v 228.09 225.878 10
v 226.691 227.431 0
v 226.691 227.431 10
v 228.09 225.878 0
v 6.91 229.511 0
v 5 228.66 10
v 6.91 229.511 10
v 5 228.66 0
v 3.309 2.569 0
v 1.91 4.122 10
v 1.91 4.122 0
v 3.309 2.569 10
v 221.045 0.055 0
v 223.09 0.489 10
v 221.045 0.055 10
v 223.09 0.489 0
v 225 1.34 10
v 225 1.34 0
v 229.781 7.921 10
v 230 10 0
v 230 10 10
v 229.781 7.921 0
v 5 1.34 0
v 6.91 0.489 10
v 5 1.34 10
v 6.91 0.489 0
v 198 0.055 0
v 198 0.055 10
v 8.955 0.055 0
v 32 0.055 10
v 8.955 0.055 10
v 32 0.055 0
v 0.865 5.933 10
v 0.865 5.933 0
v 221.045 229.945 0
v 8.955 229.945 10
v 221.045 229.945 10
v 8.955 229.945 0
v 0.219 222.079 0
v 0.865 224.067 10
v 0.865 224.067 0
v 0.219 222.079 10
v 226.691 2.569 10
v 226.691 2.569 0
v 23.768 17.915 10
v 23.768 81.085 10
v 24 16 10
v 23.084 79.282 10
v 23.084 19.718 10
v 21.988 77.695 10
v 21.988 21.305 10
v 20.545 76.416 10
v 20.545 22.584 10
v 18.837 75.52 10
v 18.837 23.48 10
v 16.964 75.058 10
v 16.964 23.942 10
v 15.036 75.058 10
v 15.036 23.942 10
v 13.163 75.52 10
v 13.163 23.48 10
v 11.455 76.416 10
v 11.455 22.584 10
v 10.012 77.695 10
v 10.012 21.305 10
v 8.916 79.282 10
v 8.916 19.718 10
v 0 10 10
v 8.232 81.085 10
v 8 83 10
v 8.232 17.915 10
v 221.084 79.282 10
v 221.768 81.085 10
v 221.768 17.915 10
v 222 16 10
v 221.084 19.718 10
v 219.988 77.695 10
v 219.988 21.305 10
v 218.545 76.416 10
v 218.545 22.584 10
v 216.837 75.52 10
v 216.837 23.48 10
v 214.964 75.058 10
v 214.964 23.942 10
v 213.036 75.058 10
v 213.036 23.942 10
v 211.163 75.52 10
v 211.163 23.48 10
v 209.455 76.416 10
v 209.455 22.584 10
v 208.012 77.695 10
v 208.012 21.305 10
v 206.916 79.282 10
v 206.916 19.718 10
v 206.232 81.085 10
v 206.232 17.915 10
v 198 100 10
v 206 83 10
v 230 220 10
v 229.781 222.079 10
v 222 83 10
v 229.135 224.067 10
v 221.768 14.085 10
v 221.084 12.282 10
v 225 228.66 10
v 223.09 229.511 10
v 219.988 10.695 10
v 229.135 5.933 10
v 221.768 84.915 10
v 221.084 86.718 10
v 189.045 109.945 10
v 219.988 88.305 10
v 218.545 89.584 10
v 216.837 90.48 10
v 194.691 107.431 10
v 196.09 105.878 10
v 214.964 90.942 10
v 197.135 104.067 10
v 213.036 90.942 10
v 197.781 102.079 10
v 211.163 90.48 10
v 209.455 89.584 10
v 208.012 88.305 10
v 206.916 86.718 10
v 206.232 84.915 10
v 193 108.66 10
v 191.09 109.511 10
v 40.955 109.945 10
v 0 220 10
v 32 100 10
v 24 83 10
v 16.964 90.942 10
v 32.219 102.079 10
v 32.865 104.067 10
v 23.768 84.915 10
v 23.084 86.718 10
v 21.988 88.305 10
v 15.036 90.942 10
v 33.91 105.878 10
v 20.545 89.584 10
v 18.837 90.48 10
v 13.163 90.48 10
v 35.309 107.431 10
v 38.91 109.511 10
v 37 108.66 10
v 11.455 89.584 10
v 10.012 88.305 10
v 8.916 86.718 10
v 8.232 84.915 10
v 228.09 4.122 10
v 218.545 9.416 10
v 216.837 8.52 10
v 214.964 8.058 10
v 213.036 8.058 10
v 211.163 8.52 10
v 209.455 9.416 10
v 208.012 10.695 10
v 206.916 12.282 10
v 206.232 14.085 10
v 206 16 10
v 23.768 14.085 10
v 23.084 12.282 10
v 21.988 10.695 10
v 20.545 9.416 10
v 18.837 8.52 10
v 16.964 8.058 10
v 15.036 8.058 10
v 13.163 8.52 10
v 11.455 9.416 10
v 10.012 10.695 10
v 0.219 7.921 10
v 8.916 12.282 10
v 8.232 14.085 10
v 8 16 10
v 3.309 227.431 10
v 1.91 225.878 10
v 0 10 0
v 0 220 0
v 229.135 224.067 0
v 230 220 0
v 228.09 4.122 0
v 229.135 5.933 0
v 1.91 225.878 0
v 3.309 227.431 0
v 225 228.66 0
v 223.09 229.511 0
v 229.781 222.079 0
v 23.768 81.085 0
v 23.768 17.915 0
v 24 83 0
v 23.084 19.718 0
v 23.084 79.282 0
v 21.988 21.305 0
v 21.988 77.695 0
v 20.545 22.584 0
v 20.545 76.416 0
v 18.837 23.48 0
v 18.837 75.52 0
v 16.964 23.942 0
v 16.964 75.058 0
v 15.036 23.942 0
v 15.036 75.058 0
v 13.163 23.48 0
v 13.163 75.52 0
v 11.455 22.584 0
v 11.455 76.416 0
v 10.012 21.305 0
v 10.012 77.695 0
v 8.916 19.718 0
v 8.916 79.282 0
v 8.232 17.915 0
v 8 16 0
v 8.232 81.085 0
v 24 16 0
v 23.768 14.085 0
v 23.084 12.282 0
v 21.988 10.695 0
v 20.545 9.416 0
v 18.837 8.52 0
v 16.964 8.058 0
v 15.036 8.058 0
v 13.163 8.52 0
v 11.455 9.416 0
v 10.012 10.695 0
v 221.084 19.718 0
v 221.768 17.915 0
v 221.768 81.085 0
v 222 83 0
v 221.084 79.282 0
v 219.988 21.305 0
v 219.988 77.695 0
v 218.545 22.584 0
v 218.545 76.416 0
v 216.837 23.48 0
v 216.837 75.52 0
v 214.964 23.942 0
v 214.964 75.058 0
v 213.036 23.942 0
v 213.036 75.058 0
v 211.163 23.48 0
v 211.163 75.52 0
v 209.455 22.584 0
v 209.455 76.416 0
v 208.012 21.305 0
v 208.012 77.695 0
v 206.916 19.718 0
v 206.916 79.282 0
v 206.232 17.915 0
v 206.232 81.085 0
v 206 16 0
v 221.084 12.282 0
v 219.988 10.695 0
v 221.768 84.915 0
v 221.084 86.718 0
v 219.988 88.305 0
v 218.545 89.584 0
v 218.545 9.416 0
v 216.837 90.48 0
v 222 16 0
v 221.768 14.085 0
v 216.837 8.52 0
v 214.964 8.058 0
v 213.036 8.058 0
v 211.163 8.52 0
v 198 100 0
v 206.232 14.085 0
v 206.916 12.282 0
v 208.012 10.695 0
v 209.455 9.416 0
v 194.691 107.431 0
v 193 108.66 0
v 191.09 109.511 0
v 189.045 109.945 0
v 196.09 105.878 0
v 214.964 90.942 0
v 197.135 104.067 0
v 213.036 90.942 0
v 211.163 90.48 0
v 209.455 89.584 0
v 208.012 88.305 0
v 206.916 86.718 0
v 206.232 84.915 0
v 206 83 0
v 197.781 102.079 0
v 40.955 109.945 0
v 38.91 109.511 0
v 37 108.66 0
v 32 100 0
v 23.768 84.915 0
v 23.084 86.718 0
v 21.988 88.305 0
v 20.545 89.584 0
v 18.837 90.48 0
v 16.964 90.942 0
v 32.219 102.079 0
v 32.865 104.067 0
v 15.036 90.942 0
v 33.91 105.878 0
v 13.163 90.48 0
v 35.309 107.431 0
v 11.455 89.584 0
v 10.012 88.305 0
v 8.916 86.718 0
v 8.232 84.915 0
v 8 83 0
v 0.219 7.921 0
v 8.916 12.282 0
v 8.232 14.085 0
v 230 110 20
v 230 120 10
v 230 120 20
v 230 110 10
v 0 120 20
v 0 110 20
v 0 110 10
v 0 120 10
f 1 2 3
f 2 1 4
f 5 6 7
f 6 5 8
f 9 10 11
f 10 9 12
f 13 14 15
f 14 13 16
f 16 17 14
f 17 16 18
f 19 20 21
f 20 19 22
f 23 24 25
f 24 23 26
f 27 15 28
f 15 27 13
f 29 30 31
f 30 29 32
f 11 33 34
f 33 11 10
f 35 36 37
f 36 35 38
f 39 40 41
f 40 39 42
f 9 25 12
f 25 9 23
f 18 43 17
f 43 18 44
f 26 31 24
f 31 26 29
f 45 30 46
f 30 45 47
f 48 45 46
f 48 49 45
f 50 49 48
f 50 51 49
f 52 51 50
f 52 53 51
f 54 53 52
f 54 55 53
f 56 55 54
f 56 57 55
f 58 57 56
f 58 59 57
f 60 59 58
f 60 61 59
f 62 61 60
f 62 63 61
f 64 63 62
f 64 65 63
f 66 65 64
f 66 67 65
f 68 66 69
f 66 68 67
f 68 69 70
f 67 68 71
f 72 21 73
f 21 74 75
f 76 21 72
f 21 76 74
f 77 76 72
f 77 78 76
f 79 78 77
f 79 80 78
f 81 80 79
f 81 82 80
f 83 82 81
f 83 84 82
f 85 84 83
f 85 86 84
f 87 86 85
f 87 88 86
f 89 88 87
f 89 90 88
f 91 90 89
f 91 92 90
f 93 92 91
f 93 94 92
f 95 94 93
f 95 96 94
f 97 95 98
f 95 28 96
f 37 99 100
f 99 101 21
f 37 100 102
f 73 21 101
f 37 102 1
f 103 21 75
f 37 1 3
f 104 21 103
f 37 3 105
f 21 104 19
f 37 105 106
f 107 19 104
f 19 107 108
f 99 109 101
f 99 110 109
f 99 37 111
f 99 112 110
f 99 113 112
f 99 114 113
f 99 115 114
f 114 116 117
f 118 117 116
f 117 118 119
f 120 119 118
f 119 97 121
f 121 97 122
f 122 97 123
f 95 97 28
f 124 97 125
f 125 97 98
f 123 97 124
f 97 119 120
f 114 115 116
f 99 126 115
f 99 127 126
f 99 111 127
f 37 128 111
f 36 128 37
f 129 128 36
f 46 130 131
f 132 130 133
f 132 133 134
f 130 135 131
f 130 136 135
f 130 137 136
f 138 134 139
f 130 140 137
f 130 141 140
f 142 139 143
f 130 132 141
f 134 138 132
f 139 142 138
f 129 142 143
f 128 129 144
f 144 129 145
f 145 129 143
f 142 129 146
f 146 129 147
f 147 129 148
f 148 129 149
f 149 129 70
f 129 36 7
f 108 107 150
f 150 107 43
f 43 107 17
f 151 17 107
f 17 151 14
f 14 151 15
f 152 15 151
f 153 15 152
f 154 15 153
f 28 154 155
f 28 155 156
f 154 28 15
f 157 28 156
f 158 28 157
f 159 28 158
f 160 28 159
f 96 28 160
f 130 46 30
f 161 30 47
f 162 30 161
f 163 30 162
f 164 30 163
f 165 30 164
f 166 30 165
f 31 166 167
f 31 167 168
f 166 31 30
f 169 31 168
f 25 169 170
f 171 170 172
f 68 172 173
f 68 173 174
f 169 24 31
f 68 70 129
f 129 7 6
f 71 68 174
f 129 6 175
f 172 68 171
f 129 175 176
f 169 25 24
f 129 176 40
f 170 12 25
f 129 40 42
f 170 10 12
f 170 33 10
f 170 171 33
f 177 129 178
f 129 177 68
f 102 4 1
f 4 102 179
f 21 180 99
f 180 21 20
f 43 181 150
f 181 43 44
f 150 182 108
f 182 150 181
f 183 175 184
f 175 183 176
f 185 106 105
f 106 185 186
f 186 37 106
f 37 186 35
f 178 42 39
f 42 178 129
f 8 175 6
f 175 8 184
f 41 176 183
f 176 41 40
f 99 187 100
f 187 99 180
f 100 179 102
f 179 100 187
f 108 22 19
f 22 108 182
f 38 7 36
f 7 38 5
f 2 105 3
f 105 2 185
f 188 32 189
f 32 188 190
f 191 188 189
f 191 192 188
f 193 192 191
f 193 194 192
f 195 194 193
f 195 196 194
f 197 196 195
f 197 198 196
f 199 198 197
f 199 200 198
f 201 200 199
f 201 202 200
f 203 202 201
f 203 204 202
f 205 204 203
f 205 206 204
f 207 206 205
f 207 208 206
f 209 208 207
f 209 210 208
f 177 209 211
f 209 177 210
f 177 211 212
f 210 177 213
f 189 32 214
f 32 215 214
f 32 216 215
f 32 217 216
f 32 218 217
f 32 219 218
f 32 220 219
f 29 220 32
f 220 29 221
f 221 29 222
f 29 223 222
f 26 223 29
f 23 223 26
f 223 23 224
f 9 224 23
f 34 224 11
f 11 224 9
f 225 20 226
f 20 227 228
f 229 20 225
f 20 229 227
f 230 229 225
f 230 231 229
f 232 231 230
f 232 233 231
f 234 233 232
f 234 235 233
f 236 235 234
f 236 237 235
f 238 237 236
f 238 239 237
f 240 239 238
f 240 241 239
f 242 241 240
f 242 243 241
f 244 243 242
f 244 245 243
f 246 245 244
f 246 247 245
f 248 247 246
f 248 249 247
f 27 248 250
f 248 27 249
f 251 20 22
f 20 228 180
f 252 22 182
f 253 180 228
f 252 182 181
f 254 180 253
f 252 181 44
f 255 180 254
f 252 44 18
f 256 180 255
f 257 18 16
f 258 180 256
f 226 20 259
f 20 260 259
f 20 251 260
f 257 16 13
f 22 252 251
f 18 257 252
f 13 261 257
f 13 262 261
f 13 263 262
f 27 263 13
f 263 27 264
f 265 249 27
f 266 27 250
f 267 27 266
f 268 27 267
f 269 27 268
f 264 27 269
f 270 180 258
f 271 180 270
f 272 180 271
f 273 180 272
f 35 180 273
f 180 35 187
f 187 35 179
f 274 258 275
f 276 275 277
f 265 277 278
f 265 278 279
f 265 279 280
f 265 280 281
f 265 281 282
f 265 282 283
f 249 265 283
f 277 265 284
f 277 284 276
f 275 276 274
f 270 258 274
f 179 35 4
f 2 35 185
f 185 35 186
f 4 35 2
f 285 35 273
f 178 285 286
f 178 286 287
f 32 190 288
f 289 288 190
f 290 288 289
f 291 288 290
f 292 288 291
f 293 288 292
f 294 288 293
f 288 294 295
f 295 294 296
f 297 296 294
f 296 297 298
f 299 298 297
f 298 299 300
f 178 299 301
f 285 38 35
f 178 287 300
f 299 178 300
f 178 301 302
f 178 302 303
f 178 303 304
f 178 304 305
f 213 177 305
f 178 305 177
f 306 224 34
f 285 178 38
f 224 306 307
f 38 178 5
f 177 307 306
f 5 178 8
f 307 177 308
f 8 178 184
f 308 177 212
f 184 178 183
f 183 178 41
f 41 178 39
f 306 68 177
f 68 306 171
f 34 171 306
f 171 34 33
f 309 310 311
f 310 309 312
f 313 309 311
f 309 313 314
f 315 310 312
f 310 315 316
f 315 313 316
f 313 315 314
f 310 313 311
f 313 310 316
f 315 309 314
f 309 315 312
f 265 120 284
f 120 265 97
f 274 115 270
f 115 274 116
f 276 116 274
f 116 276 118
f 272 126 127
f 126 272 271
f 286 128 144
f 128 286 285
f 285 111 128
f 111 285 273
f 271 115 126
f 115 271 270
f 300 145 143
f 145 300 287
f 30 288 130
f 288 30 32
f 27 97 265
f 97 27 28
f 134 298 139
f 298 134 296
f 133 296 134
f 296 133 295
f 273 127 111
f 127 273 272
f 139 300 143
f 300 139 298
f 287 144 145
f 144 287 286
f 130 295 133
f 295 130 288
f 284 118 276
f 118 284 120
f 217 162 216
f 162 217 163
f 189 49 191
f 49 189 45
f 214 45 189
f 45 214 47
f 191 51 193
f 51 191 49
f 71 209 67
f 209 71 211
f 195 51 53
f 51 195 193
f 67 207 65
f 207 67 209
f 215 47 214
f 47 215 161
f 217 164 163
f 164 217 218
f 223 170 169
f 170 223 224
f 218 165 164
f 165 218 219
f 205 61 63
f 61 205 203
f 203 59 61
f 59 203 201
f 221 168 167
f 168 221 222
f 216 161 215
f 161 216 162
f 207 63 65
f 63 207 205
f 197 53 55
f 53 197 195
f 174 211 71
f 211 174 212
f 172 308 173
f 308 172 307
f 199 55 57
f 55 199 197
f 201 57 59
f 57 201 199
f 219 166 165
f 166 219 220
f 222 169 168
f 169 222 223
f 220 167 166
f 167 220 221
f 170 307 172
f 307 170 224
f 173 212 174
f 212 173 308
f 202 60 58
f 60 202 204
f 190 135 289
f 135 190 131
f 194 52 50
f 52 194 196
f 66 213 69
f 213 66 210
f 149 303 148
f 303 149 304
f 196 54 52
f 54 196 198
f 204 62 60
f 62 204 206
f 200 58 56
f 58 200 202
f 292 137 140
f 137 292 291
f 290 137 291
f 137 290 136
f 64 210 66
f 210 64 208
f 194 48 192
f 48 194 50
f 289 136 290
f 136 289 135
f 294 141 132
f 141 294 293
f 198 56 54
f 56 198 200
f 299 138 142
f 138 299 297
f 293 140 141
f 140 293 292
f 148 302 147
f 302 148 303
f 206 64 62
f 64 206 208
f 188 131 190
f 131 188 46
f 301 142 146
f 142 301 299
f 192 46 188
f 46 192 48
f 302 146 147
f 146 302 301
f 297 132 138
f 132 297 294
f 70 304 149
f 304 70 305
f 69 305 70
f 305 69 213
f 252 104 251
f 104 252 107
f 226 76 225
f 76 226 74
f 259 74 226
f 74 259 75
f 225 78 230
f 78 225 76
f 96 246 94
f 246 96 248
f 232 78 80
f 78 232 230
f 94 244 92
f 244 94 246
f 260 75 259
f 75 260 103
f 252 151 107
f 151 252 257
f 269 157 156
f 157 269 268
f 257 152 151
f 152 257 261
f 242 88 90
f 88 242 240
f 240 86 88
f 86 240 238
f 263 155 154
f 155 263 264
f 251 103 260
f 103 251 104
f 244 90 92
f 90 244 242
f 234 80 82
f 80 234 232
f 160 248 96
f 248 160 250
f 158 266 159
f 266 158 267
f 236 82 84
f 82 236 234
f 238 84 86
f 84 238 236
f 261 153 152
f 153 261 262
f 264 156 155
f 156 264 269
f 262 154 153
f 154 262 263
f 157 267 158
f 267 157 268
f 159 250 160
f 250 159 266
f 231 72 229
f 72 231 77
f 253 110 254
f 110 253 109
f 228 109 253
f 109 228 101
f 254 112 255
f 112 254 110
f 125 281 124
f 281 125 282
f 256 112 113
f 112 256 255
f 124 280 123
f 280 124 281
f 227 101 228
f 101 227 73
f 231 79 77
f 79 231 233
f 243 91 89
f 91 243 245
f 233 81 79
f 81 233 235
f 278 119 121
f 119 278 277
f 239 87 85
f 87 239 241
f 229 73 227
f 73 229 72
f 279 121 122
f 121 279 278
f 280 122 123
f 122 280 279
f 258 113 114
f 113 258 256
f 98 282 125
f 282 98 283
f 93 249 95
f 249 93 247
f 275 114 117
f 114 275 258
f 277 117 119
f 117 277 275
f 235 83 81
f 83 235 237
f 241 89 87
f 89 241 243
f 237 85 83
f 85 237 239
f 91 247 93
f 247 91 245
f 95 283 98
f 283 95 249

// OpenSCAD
// file: lib_soft.scad
/** 
 * An OpenSCAD library for creating shapes with rounded edges
 *
 * @author Paul Generes <paul.generes@gmail.com>
 * @example soft_example.scad
 */
 
module soft_cube(size=[1, 1, 1], center=false, cr=1) {
	tr = [cr, cr, cr];

    translate(tr) {
        minkowski() {
            sphere(cr);
            cube([size[0]-2*cr, size[1]-2*cr, size[2]-2*cr], center);
        }
    }
}

module softxyz_cube(size=1, center=false, cr=[1, 1, 1]) {
	tr = cr;

    translate(tr) {
        minkowski() {
			scale(cr) {
				sphere(1);
			}
            cube([size[0]-2*cr[0], size[1]-2*cr[1], size[2]-2*cr[2]], center);
        }
    }
}

module softz_cube(size=1, center=false, cr=1) {
	tr = [cr, cr, 0];

    translate(tr) {
        minkowski() {
			cylinder(h=0.00001, r=cr);
			cube([size[0]-2*cr, size[1]-2*cr, size[2]-0.00001], center);
        }
    }
}
// file: lib_boxes5.scad
// boxes5.scad

/**
x1 = width
y1 = depth
z1 = height
r1 = radius of corners
*/
module rounded_rectangle(x1, y1, z1, r1) {
    if (r1 > 0.00001) { // deal with rounding errors 
		translate([r1, r1, 0]) {
			minkowski () {
				cube([x1-2*r1, y1-2*r1, z1/2]);
				cylinder(z1/2, r1, r1);
			}
		}
	} else {
		cube([x1, y1, z1]);
	}
}

/**
x1 = width
y1 = depth
z1 = height
r1 = radius of corners
d1 = thickness
*/
module rounded_ring(x1, y1, z1, r1, d1) {
	difference () {
		rounded_rectangle(x1, y1, z1, r1);
		translate([d1, d1, 0]) {
			rounded_rectangle(x1-2*d1, y1-2*d1, z1+0.001, r1-d1);
		}
	}
}

/**
x1 = width
y1 = depth
z1 = height
r1 = radius of corners
d1 = thickness
*/
module open_box(x1, y1, z1, r1, d1) {
	rounded_rectangle(x1, y1, d1, r1);
	rounded_ring(x1, y1, z1, r1, d1);
}

/**
Bottom of a friction fit box
x1 = width
y1 = depth
z1 = height
r1 = radius of corners
d1 = thickness
z2 = friction
d2 = tolerance
*/
module box_bottom(x1, y1, z1, r1, d1, z2, d2) {
	x2 = d1/2+d2/2;
	y2 = d1/2+d2/2;
	x3 = x1-2*x2;
	y3 = y1-2*y2;
	r3 = max(r1-x2, 0);
	d3 = d1/2-d2/2;
	mm = floor(min(x1, y1)/10);

	difference() {
		union() {
			open_box(x1, y1, z1-z2, r1, d1);
			translate([x2, y2, 0]) {
				rounded_ring(x3, y3, z1-d2, r3, d3);
			}
		}
		*for (ii = [1 : mm]) {
			xx1 = 5*ii;
			xx2 = x1-10*ii;
			yy1 = 5*ii;
			yy2 = y1-10*ii;
			rr2 = r1-5*ii;
			translate([xx1, yy1, 0]) {
				rounded_ring(xx2, yy2, 0.65, rr2, 3);
			}
		}
	}
}

/**
Top of a friction fit box.
x1 = width
y1 = depth
z1 = height
r1 = radius of corners
d1 = thickness
z2 = friction
d2 = tolerance
*/
module box_top(x1, y1, z1, r1, d1, z2, d2) {
	x2 = d1/2+d2;
	y2 = d1/2+d2;
	x3 = x1-2*x2;
	y3 = y1-2*y2;
	z3 = z1+z2-d2;
	r3 = max(r1-x2, 0);
	d3 = d1/2-d2/2;
	mm = floor(min(x1, y1)/10);
	
	difference() {
		union() {
			open_box(x1, y1, z1-z2, r1, d1);
			rounded_ring(x1, y1, z1-d2, r1, d3);
		}

		*for (ii = [1 : mm]) {
			xx1 = 5*ii;
			xx2 = x1-10*ii;
			yy1 = 5*ii;
			yy2 = y1-10*ii;
			rr2 = r1-5*ii;
			translate([xx1, yy1, 0]) {
				rounded_ring(xx2, yy2, 0.65, rr2, 3);
			}
		}
	}
}

/**
x1 = width
y1 = depth
z1 = height
r1 = radius of corners
d1 = thickness
z2 = friction
d2 = tolerance
r2 = radius of fingers
*/
module fingers(x1, y1, z1, r1, d1, z2, d2, r2) {
	zz = max(z1, r2+d2);
    translate([0, y1/2, zz]) {
		rotate([0, 90, 0]) {
			translate([0, 0, -1]) {
				cylinder(x1+2, r2, r2);
			}
		}
	}
}

/**
x1 = width
y1 = depth
z1 = height
d1 = thickness
z2 = friction
d2 = tolerance
*/
module pimples(x1, y1, z1, d1, z2, d2) {
	translate([x1/2, (d1/2), z1-(z2/2)]) {
		sphere(d1/2);
	}
	translate([x1/2, y1-(d1/2), z1-(z2/2)]) {
		sphere(d1/2);
	}
}
// main file
use <lib_boxes5.scad>
use <lib_soft.scad>

//wi = 140.0;
th = 10.0;  // thickness


x1 = 230;
y1 = 230;
d1 = 120;


bd2 = 16; // bolt hole
bd1 = 35; // arm hole
bx1 = bd2*2;
by1 = bd1+4*bd2;
bz1 = 72;

intersection() {
    //cube([250, 250, 0.65]);
    difference() {
        
        union () {
            softz_cube([x1, y1, th], cr=10);
            translate([0, 110, th]) cube([x1, th, th]);
        }
        
        translate([bd2*2, 0, 0]) {
            softz_cube([x1-4*bd2, 110, th], cr=10);
            cube([x1-4*bd2, 10, th]);
        }
        
        translate([bx1 / 2, bd2, 0]) {
            cylinder(d=bd2, h=bz1);
        }
        translate([bx1 / 2, by1 - bd2, 0]) {
            cylinder(d=bd2, h=bz1);
        }
        translate([x1 - bx1 / 2, bd2, 0]) {
            cylinder(d=bd2, h=bz1);
        }
        translate([x1 - bx1 / 2, by1 - bd2, 0]) {
            cylinder(d=bd2, h=bz1);
        }
    }
}
